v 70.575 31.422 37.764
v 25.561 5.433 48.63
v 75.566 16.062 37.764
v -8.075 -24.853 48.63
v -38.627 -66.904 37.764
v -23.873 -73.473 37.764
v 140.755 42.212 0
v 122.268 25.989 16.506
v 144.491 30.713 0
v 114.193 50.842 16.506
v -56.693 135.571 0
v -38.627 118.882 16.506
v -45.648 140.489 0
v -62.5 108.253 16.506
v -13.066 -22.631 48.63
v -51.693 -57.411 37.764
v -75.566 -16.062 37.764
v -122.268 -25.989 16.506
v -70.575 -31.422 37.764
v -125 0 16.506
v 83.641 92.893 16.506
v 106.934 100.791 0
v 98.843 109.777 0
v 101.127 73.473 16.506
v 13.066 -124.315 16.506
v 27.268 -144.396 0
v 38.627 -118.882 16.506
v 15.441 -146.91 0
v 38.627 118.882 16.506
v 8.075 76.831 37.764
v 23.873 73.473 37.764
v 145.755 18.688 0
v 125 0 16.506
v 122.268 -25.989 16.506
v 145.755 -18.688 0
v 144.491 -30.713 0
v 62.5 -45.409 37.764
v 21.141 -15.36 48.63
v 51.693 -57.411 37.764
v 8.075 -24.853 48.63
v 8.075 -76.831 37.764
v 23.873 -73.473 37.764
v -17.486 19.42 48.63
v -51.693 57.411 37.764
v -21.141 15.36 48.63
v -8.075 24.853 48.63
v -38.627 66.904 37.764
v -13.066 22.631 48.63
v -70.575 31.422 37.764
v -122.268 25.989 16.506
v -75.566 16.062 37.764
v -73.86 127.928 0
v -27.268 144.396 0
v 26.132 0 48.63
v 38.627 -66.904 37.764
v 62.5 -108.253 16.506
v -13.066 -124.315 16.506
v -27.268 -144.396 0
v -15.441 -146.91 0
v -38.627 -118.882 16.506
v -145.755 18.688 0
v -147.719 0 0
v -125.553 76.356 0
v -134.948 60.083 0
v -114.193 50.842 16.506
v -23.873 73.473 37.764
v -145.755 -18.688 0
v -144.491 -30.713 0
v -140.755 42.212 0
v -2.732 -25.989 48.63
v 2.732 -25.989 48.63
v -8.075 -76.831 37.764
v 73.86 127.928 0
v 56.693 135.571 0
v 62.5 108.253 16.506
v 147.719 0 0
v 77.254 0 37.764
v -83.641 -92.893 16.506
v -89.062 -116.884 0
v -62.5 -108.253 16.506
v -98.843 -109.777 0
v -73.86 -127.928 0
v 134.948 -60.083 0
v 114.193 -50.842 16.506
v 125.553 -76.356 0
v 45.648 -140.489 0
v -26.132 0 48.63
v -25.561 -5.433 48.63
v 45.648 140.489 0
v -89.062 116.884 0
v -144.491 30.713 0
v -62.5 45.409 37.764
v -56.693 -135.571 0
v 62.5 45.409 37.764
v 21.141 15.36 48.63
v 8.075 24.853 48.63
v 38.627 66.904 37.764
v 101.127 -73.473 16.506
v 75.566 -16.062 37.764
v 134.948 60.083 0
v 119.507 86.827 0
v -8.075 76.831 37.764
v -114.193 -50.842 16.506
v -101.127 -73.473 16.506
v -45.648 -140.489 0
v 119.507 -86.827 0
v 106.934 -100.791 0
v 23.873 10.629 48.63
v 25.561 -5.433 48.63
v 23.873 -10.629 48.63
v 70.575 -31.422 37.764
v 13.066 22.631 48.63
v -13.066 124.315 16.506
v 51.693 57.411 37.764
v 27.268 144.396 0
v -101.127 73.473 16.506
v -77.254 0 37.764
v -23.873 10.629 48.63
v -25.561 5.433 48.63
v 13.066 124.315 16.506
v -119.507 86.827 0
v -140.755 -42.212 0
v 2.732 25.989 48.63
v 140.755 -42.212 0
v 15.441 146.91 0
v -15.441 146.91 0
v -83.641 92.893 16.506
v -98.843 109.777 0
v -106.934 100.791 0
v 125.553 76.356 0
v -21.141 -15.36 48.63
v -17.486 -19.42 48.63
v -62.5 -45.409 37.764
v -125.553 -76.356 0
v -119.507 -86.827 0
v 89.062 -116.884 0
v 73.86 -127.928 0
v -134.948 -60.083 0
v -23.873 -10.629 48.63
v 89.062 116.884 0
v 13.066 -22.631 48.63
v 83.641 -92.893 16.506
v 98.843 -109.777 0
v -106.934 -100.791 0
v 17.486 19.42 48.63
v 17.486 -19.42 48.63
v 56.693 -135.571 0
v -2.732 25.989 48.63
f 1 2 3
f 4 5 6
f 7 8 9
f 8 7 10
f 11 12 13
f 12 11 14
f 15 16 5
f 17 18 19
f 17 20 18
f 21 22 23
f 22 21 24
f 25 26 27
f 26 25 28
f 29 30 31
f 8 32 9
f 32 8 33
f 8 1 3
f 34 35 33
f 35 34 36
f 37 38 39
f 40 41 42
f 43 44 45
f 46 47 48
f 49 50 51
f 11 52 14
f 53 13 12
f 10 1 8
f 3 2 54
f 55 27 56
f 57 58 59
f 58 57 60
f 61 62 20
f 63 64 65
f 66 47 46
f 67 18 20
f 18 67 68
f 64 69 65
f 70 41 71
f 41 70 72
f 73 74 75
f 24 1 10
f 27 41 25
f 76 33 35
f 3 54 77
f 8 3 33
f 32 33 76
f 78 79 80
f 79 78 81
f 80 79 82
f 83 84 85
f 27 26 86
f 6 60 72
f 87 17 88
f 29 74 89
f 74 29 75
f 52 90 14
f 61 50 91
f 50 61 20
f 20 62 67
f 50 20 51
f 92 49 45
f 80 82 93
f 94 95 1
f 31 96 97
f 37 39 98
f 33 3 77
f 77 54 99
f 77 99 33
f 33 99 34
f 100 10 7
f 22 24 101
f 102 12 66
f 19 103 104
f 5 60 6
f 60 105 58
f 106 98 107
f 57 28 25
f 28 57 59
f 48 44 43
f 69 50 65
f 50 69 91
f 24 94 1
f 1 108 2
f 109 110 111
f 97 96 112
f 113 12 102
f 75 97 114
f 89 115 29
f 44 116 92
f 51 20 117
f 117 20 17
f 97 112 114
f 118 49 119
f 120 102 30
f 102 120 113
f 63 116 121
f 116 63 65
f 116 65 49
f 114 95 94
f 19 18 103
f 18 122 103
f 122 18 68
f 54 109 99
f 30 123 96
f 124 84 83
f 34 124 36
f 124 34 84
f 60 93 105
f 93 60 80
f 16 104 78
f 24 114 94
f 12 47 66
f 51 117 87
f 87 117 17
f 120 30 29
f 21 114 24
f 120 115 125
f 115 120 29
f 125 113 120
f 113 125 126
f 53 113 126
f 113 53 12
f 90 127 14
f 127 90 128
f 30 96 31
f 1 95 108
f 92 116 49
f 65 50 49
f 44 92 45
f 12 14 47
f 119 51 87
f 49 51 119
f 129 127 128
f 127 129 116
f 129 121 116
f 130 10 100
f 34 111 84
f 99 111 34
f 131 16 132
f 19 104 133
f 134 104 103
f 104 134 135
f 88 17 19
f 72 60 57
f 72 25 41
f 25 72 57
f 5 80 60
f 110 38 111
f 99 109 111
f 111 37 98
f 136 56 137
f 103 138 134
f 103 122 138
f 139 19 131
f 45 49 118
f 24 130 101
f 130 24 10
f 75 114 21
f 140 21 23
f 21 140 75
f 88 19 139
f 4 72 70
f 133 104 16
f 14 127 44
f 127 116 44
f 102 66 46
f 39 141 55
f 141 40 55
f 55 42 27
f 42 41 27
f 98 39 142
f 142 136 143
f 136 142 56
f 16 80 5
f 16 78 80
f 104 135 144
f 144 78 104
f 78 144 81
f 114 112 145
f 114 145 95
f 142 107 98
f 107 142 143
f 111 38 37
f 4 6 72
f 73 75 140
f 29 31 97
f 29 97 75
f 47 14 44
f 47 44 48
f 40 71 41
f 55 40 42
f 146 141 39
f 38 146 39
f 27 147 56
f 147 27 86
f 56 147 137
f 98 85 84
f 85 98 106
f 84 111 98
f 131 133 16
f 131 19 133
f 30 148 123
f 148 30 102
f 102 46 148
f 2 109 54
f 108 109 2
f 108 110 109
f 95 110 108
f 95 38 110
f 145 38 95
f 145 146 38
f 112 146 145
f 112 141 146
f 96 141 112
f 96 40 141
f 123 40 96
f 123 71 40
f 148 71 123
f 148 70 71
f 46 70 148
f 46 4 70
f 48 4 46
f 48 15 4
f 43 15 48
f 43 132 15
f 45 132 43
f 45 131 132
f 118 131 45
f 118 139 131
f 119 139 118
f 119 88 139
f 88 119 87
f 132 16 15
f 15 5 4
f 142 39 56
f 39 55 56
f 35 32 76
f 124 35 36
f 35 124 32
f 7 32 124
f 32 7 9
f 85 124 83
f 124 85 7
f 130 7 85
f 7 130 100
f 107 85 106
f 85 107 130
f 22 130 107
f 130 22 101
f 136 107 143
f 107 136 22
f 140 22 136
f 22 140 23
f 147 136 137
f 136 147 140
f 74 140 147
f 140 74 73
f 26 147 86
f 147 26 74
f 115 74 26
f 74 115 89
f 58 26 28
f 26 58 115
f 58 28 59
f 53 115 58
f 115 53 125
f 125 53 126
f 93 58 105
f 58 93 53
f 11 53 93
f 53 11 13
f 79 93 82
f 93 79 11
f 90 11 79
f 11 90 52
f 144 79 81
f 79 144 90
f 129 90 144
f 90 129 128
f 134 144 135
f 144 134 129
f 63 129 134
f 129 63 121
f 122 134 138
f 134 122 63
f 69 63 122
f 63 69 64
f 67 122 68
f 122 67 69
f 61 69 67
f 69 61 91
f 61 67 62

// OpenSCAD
sphereDia = 500;
torchit = 50;

module Side() {

    difference(){

        translate([0,0,-(sphereDia/2 - torchit)])
        sphere(d = sphereDia);

        translate([0,0,-500])
        cylinder(h=1000, r=1000, center=true);
    }
}

Side();
